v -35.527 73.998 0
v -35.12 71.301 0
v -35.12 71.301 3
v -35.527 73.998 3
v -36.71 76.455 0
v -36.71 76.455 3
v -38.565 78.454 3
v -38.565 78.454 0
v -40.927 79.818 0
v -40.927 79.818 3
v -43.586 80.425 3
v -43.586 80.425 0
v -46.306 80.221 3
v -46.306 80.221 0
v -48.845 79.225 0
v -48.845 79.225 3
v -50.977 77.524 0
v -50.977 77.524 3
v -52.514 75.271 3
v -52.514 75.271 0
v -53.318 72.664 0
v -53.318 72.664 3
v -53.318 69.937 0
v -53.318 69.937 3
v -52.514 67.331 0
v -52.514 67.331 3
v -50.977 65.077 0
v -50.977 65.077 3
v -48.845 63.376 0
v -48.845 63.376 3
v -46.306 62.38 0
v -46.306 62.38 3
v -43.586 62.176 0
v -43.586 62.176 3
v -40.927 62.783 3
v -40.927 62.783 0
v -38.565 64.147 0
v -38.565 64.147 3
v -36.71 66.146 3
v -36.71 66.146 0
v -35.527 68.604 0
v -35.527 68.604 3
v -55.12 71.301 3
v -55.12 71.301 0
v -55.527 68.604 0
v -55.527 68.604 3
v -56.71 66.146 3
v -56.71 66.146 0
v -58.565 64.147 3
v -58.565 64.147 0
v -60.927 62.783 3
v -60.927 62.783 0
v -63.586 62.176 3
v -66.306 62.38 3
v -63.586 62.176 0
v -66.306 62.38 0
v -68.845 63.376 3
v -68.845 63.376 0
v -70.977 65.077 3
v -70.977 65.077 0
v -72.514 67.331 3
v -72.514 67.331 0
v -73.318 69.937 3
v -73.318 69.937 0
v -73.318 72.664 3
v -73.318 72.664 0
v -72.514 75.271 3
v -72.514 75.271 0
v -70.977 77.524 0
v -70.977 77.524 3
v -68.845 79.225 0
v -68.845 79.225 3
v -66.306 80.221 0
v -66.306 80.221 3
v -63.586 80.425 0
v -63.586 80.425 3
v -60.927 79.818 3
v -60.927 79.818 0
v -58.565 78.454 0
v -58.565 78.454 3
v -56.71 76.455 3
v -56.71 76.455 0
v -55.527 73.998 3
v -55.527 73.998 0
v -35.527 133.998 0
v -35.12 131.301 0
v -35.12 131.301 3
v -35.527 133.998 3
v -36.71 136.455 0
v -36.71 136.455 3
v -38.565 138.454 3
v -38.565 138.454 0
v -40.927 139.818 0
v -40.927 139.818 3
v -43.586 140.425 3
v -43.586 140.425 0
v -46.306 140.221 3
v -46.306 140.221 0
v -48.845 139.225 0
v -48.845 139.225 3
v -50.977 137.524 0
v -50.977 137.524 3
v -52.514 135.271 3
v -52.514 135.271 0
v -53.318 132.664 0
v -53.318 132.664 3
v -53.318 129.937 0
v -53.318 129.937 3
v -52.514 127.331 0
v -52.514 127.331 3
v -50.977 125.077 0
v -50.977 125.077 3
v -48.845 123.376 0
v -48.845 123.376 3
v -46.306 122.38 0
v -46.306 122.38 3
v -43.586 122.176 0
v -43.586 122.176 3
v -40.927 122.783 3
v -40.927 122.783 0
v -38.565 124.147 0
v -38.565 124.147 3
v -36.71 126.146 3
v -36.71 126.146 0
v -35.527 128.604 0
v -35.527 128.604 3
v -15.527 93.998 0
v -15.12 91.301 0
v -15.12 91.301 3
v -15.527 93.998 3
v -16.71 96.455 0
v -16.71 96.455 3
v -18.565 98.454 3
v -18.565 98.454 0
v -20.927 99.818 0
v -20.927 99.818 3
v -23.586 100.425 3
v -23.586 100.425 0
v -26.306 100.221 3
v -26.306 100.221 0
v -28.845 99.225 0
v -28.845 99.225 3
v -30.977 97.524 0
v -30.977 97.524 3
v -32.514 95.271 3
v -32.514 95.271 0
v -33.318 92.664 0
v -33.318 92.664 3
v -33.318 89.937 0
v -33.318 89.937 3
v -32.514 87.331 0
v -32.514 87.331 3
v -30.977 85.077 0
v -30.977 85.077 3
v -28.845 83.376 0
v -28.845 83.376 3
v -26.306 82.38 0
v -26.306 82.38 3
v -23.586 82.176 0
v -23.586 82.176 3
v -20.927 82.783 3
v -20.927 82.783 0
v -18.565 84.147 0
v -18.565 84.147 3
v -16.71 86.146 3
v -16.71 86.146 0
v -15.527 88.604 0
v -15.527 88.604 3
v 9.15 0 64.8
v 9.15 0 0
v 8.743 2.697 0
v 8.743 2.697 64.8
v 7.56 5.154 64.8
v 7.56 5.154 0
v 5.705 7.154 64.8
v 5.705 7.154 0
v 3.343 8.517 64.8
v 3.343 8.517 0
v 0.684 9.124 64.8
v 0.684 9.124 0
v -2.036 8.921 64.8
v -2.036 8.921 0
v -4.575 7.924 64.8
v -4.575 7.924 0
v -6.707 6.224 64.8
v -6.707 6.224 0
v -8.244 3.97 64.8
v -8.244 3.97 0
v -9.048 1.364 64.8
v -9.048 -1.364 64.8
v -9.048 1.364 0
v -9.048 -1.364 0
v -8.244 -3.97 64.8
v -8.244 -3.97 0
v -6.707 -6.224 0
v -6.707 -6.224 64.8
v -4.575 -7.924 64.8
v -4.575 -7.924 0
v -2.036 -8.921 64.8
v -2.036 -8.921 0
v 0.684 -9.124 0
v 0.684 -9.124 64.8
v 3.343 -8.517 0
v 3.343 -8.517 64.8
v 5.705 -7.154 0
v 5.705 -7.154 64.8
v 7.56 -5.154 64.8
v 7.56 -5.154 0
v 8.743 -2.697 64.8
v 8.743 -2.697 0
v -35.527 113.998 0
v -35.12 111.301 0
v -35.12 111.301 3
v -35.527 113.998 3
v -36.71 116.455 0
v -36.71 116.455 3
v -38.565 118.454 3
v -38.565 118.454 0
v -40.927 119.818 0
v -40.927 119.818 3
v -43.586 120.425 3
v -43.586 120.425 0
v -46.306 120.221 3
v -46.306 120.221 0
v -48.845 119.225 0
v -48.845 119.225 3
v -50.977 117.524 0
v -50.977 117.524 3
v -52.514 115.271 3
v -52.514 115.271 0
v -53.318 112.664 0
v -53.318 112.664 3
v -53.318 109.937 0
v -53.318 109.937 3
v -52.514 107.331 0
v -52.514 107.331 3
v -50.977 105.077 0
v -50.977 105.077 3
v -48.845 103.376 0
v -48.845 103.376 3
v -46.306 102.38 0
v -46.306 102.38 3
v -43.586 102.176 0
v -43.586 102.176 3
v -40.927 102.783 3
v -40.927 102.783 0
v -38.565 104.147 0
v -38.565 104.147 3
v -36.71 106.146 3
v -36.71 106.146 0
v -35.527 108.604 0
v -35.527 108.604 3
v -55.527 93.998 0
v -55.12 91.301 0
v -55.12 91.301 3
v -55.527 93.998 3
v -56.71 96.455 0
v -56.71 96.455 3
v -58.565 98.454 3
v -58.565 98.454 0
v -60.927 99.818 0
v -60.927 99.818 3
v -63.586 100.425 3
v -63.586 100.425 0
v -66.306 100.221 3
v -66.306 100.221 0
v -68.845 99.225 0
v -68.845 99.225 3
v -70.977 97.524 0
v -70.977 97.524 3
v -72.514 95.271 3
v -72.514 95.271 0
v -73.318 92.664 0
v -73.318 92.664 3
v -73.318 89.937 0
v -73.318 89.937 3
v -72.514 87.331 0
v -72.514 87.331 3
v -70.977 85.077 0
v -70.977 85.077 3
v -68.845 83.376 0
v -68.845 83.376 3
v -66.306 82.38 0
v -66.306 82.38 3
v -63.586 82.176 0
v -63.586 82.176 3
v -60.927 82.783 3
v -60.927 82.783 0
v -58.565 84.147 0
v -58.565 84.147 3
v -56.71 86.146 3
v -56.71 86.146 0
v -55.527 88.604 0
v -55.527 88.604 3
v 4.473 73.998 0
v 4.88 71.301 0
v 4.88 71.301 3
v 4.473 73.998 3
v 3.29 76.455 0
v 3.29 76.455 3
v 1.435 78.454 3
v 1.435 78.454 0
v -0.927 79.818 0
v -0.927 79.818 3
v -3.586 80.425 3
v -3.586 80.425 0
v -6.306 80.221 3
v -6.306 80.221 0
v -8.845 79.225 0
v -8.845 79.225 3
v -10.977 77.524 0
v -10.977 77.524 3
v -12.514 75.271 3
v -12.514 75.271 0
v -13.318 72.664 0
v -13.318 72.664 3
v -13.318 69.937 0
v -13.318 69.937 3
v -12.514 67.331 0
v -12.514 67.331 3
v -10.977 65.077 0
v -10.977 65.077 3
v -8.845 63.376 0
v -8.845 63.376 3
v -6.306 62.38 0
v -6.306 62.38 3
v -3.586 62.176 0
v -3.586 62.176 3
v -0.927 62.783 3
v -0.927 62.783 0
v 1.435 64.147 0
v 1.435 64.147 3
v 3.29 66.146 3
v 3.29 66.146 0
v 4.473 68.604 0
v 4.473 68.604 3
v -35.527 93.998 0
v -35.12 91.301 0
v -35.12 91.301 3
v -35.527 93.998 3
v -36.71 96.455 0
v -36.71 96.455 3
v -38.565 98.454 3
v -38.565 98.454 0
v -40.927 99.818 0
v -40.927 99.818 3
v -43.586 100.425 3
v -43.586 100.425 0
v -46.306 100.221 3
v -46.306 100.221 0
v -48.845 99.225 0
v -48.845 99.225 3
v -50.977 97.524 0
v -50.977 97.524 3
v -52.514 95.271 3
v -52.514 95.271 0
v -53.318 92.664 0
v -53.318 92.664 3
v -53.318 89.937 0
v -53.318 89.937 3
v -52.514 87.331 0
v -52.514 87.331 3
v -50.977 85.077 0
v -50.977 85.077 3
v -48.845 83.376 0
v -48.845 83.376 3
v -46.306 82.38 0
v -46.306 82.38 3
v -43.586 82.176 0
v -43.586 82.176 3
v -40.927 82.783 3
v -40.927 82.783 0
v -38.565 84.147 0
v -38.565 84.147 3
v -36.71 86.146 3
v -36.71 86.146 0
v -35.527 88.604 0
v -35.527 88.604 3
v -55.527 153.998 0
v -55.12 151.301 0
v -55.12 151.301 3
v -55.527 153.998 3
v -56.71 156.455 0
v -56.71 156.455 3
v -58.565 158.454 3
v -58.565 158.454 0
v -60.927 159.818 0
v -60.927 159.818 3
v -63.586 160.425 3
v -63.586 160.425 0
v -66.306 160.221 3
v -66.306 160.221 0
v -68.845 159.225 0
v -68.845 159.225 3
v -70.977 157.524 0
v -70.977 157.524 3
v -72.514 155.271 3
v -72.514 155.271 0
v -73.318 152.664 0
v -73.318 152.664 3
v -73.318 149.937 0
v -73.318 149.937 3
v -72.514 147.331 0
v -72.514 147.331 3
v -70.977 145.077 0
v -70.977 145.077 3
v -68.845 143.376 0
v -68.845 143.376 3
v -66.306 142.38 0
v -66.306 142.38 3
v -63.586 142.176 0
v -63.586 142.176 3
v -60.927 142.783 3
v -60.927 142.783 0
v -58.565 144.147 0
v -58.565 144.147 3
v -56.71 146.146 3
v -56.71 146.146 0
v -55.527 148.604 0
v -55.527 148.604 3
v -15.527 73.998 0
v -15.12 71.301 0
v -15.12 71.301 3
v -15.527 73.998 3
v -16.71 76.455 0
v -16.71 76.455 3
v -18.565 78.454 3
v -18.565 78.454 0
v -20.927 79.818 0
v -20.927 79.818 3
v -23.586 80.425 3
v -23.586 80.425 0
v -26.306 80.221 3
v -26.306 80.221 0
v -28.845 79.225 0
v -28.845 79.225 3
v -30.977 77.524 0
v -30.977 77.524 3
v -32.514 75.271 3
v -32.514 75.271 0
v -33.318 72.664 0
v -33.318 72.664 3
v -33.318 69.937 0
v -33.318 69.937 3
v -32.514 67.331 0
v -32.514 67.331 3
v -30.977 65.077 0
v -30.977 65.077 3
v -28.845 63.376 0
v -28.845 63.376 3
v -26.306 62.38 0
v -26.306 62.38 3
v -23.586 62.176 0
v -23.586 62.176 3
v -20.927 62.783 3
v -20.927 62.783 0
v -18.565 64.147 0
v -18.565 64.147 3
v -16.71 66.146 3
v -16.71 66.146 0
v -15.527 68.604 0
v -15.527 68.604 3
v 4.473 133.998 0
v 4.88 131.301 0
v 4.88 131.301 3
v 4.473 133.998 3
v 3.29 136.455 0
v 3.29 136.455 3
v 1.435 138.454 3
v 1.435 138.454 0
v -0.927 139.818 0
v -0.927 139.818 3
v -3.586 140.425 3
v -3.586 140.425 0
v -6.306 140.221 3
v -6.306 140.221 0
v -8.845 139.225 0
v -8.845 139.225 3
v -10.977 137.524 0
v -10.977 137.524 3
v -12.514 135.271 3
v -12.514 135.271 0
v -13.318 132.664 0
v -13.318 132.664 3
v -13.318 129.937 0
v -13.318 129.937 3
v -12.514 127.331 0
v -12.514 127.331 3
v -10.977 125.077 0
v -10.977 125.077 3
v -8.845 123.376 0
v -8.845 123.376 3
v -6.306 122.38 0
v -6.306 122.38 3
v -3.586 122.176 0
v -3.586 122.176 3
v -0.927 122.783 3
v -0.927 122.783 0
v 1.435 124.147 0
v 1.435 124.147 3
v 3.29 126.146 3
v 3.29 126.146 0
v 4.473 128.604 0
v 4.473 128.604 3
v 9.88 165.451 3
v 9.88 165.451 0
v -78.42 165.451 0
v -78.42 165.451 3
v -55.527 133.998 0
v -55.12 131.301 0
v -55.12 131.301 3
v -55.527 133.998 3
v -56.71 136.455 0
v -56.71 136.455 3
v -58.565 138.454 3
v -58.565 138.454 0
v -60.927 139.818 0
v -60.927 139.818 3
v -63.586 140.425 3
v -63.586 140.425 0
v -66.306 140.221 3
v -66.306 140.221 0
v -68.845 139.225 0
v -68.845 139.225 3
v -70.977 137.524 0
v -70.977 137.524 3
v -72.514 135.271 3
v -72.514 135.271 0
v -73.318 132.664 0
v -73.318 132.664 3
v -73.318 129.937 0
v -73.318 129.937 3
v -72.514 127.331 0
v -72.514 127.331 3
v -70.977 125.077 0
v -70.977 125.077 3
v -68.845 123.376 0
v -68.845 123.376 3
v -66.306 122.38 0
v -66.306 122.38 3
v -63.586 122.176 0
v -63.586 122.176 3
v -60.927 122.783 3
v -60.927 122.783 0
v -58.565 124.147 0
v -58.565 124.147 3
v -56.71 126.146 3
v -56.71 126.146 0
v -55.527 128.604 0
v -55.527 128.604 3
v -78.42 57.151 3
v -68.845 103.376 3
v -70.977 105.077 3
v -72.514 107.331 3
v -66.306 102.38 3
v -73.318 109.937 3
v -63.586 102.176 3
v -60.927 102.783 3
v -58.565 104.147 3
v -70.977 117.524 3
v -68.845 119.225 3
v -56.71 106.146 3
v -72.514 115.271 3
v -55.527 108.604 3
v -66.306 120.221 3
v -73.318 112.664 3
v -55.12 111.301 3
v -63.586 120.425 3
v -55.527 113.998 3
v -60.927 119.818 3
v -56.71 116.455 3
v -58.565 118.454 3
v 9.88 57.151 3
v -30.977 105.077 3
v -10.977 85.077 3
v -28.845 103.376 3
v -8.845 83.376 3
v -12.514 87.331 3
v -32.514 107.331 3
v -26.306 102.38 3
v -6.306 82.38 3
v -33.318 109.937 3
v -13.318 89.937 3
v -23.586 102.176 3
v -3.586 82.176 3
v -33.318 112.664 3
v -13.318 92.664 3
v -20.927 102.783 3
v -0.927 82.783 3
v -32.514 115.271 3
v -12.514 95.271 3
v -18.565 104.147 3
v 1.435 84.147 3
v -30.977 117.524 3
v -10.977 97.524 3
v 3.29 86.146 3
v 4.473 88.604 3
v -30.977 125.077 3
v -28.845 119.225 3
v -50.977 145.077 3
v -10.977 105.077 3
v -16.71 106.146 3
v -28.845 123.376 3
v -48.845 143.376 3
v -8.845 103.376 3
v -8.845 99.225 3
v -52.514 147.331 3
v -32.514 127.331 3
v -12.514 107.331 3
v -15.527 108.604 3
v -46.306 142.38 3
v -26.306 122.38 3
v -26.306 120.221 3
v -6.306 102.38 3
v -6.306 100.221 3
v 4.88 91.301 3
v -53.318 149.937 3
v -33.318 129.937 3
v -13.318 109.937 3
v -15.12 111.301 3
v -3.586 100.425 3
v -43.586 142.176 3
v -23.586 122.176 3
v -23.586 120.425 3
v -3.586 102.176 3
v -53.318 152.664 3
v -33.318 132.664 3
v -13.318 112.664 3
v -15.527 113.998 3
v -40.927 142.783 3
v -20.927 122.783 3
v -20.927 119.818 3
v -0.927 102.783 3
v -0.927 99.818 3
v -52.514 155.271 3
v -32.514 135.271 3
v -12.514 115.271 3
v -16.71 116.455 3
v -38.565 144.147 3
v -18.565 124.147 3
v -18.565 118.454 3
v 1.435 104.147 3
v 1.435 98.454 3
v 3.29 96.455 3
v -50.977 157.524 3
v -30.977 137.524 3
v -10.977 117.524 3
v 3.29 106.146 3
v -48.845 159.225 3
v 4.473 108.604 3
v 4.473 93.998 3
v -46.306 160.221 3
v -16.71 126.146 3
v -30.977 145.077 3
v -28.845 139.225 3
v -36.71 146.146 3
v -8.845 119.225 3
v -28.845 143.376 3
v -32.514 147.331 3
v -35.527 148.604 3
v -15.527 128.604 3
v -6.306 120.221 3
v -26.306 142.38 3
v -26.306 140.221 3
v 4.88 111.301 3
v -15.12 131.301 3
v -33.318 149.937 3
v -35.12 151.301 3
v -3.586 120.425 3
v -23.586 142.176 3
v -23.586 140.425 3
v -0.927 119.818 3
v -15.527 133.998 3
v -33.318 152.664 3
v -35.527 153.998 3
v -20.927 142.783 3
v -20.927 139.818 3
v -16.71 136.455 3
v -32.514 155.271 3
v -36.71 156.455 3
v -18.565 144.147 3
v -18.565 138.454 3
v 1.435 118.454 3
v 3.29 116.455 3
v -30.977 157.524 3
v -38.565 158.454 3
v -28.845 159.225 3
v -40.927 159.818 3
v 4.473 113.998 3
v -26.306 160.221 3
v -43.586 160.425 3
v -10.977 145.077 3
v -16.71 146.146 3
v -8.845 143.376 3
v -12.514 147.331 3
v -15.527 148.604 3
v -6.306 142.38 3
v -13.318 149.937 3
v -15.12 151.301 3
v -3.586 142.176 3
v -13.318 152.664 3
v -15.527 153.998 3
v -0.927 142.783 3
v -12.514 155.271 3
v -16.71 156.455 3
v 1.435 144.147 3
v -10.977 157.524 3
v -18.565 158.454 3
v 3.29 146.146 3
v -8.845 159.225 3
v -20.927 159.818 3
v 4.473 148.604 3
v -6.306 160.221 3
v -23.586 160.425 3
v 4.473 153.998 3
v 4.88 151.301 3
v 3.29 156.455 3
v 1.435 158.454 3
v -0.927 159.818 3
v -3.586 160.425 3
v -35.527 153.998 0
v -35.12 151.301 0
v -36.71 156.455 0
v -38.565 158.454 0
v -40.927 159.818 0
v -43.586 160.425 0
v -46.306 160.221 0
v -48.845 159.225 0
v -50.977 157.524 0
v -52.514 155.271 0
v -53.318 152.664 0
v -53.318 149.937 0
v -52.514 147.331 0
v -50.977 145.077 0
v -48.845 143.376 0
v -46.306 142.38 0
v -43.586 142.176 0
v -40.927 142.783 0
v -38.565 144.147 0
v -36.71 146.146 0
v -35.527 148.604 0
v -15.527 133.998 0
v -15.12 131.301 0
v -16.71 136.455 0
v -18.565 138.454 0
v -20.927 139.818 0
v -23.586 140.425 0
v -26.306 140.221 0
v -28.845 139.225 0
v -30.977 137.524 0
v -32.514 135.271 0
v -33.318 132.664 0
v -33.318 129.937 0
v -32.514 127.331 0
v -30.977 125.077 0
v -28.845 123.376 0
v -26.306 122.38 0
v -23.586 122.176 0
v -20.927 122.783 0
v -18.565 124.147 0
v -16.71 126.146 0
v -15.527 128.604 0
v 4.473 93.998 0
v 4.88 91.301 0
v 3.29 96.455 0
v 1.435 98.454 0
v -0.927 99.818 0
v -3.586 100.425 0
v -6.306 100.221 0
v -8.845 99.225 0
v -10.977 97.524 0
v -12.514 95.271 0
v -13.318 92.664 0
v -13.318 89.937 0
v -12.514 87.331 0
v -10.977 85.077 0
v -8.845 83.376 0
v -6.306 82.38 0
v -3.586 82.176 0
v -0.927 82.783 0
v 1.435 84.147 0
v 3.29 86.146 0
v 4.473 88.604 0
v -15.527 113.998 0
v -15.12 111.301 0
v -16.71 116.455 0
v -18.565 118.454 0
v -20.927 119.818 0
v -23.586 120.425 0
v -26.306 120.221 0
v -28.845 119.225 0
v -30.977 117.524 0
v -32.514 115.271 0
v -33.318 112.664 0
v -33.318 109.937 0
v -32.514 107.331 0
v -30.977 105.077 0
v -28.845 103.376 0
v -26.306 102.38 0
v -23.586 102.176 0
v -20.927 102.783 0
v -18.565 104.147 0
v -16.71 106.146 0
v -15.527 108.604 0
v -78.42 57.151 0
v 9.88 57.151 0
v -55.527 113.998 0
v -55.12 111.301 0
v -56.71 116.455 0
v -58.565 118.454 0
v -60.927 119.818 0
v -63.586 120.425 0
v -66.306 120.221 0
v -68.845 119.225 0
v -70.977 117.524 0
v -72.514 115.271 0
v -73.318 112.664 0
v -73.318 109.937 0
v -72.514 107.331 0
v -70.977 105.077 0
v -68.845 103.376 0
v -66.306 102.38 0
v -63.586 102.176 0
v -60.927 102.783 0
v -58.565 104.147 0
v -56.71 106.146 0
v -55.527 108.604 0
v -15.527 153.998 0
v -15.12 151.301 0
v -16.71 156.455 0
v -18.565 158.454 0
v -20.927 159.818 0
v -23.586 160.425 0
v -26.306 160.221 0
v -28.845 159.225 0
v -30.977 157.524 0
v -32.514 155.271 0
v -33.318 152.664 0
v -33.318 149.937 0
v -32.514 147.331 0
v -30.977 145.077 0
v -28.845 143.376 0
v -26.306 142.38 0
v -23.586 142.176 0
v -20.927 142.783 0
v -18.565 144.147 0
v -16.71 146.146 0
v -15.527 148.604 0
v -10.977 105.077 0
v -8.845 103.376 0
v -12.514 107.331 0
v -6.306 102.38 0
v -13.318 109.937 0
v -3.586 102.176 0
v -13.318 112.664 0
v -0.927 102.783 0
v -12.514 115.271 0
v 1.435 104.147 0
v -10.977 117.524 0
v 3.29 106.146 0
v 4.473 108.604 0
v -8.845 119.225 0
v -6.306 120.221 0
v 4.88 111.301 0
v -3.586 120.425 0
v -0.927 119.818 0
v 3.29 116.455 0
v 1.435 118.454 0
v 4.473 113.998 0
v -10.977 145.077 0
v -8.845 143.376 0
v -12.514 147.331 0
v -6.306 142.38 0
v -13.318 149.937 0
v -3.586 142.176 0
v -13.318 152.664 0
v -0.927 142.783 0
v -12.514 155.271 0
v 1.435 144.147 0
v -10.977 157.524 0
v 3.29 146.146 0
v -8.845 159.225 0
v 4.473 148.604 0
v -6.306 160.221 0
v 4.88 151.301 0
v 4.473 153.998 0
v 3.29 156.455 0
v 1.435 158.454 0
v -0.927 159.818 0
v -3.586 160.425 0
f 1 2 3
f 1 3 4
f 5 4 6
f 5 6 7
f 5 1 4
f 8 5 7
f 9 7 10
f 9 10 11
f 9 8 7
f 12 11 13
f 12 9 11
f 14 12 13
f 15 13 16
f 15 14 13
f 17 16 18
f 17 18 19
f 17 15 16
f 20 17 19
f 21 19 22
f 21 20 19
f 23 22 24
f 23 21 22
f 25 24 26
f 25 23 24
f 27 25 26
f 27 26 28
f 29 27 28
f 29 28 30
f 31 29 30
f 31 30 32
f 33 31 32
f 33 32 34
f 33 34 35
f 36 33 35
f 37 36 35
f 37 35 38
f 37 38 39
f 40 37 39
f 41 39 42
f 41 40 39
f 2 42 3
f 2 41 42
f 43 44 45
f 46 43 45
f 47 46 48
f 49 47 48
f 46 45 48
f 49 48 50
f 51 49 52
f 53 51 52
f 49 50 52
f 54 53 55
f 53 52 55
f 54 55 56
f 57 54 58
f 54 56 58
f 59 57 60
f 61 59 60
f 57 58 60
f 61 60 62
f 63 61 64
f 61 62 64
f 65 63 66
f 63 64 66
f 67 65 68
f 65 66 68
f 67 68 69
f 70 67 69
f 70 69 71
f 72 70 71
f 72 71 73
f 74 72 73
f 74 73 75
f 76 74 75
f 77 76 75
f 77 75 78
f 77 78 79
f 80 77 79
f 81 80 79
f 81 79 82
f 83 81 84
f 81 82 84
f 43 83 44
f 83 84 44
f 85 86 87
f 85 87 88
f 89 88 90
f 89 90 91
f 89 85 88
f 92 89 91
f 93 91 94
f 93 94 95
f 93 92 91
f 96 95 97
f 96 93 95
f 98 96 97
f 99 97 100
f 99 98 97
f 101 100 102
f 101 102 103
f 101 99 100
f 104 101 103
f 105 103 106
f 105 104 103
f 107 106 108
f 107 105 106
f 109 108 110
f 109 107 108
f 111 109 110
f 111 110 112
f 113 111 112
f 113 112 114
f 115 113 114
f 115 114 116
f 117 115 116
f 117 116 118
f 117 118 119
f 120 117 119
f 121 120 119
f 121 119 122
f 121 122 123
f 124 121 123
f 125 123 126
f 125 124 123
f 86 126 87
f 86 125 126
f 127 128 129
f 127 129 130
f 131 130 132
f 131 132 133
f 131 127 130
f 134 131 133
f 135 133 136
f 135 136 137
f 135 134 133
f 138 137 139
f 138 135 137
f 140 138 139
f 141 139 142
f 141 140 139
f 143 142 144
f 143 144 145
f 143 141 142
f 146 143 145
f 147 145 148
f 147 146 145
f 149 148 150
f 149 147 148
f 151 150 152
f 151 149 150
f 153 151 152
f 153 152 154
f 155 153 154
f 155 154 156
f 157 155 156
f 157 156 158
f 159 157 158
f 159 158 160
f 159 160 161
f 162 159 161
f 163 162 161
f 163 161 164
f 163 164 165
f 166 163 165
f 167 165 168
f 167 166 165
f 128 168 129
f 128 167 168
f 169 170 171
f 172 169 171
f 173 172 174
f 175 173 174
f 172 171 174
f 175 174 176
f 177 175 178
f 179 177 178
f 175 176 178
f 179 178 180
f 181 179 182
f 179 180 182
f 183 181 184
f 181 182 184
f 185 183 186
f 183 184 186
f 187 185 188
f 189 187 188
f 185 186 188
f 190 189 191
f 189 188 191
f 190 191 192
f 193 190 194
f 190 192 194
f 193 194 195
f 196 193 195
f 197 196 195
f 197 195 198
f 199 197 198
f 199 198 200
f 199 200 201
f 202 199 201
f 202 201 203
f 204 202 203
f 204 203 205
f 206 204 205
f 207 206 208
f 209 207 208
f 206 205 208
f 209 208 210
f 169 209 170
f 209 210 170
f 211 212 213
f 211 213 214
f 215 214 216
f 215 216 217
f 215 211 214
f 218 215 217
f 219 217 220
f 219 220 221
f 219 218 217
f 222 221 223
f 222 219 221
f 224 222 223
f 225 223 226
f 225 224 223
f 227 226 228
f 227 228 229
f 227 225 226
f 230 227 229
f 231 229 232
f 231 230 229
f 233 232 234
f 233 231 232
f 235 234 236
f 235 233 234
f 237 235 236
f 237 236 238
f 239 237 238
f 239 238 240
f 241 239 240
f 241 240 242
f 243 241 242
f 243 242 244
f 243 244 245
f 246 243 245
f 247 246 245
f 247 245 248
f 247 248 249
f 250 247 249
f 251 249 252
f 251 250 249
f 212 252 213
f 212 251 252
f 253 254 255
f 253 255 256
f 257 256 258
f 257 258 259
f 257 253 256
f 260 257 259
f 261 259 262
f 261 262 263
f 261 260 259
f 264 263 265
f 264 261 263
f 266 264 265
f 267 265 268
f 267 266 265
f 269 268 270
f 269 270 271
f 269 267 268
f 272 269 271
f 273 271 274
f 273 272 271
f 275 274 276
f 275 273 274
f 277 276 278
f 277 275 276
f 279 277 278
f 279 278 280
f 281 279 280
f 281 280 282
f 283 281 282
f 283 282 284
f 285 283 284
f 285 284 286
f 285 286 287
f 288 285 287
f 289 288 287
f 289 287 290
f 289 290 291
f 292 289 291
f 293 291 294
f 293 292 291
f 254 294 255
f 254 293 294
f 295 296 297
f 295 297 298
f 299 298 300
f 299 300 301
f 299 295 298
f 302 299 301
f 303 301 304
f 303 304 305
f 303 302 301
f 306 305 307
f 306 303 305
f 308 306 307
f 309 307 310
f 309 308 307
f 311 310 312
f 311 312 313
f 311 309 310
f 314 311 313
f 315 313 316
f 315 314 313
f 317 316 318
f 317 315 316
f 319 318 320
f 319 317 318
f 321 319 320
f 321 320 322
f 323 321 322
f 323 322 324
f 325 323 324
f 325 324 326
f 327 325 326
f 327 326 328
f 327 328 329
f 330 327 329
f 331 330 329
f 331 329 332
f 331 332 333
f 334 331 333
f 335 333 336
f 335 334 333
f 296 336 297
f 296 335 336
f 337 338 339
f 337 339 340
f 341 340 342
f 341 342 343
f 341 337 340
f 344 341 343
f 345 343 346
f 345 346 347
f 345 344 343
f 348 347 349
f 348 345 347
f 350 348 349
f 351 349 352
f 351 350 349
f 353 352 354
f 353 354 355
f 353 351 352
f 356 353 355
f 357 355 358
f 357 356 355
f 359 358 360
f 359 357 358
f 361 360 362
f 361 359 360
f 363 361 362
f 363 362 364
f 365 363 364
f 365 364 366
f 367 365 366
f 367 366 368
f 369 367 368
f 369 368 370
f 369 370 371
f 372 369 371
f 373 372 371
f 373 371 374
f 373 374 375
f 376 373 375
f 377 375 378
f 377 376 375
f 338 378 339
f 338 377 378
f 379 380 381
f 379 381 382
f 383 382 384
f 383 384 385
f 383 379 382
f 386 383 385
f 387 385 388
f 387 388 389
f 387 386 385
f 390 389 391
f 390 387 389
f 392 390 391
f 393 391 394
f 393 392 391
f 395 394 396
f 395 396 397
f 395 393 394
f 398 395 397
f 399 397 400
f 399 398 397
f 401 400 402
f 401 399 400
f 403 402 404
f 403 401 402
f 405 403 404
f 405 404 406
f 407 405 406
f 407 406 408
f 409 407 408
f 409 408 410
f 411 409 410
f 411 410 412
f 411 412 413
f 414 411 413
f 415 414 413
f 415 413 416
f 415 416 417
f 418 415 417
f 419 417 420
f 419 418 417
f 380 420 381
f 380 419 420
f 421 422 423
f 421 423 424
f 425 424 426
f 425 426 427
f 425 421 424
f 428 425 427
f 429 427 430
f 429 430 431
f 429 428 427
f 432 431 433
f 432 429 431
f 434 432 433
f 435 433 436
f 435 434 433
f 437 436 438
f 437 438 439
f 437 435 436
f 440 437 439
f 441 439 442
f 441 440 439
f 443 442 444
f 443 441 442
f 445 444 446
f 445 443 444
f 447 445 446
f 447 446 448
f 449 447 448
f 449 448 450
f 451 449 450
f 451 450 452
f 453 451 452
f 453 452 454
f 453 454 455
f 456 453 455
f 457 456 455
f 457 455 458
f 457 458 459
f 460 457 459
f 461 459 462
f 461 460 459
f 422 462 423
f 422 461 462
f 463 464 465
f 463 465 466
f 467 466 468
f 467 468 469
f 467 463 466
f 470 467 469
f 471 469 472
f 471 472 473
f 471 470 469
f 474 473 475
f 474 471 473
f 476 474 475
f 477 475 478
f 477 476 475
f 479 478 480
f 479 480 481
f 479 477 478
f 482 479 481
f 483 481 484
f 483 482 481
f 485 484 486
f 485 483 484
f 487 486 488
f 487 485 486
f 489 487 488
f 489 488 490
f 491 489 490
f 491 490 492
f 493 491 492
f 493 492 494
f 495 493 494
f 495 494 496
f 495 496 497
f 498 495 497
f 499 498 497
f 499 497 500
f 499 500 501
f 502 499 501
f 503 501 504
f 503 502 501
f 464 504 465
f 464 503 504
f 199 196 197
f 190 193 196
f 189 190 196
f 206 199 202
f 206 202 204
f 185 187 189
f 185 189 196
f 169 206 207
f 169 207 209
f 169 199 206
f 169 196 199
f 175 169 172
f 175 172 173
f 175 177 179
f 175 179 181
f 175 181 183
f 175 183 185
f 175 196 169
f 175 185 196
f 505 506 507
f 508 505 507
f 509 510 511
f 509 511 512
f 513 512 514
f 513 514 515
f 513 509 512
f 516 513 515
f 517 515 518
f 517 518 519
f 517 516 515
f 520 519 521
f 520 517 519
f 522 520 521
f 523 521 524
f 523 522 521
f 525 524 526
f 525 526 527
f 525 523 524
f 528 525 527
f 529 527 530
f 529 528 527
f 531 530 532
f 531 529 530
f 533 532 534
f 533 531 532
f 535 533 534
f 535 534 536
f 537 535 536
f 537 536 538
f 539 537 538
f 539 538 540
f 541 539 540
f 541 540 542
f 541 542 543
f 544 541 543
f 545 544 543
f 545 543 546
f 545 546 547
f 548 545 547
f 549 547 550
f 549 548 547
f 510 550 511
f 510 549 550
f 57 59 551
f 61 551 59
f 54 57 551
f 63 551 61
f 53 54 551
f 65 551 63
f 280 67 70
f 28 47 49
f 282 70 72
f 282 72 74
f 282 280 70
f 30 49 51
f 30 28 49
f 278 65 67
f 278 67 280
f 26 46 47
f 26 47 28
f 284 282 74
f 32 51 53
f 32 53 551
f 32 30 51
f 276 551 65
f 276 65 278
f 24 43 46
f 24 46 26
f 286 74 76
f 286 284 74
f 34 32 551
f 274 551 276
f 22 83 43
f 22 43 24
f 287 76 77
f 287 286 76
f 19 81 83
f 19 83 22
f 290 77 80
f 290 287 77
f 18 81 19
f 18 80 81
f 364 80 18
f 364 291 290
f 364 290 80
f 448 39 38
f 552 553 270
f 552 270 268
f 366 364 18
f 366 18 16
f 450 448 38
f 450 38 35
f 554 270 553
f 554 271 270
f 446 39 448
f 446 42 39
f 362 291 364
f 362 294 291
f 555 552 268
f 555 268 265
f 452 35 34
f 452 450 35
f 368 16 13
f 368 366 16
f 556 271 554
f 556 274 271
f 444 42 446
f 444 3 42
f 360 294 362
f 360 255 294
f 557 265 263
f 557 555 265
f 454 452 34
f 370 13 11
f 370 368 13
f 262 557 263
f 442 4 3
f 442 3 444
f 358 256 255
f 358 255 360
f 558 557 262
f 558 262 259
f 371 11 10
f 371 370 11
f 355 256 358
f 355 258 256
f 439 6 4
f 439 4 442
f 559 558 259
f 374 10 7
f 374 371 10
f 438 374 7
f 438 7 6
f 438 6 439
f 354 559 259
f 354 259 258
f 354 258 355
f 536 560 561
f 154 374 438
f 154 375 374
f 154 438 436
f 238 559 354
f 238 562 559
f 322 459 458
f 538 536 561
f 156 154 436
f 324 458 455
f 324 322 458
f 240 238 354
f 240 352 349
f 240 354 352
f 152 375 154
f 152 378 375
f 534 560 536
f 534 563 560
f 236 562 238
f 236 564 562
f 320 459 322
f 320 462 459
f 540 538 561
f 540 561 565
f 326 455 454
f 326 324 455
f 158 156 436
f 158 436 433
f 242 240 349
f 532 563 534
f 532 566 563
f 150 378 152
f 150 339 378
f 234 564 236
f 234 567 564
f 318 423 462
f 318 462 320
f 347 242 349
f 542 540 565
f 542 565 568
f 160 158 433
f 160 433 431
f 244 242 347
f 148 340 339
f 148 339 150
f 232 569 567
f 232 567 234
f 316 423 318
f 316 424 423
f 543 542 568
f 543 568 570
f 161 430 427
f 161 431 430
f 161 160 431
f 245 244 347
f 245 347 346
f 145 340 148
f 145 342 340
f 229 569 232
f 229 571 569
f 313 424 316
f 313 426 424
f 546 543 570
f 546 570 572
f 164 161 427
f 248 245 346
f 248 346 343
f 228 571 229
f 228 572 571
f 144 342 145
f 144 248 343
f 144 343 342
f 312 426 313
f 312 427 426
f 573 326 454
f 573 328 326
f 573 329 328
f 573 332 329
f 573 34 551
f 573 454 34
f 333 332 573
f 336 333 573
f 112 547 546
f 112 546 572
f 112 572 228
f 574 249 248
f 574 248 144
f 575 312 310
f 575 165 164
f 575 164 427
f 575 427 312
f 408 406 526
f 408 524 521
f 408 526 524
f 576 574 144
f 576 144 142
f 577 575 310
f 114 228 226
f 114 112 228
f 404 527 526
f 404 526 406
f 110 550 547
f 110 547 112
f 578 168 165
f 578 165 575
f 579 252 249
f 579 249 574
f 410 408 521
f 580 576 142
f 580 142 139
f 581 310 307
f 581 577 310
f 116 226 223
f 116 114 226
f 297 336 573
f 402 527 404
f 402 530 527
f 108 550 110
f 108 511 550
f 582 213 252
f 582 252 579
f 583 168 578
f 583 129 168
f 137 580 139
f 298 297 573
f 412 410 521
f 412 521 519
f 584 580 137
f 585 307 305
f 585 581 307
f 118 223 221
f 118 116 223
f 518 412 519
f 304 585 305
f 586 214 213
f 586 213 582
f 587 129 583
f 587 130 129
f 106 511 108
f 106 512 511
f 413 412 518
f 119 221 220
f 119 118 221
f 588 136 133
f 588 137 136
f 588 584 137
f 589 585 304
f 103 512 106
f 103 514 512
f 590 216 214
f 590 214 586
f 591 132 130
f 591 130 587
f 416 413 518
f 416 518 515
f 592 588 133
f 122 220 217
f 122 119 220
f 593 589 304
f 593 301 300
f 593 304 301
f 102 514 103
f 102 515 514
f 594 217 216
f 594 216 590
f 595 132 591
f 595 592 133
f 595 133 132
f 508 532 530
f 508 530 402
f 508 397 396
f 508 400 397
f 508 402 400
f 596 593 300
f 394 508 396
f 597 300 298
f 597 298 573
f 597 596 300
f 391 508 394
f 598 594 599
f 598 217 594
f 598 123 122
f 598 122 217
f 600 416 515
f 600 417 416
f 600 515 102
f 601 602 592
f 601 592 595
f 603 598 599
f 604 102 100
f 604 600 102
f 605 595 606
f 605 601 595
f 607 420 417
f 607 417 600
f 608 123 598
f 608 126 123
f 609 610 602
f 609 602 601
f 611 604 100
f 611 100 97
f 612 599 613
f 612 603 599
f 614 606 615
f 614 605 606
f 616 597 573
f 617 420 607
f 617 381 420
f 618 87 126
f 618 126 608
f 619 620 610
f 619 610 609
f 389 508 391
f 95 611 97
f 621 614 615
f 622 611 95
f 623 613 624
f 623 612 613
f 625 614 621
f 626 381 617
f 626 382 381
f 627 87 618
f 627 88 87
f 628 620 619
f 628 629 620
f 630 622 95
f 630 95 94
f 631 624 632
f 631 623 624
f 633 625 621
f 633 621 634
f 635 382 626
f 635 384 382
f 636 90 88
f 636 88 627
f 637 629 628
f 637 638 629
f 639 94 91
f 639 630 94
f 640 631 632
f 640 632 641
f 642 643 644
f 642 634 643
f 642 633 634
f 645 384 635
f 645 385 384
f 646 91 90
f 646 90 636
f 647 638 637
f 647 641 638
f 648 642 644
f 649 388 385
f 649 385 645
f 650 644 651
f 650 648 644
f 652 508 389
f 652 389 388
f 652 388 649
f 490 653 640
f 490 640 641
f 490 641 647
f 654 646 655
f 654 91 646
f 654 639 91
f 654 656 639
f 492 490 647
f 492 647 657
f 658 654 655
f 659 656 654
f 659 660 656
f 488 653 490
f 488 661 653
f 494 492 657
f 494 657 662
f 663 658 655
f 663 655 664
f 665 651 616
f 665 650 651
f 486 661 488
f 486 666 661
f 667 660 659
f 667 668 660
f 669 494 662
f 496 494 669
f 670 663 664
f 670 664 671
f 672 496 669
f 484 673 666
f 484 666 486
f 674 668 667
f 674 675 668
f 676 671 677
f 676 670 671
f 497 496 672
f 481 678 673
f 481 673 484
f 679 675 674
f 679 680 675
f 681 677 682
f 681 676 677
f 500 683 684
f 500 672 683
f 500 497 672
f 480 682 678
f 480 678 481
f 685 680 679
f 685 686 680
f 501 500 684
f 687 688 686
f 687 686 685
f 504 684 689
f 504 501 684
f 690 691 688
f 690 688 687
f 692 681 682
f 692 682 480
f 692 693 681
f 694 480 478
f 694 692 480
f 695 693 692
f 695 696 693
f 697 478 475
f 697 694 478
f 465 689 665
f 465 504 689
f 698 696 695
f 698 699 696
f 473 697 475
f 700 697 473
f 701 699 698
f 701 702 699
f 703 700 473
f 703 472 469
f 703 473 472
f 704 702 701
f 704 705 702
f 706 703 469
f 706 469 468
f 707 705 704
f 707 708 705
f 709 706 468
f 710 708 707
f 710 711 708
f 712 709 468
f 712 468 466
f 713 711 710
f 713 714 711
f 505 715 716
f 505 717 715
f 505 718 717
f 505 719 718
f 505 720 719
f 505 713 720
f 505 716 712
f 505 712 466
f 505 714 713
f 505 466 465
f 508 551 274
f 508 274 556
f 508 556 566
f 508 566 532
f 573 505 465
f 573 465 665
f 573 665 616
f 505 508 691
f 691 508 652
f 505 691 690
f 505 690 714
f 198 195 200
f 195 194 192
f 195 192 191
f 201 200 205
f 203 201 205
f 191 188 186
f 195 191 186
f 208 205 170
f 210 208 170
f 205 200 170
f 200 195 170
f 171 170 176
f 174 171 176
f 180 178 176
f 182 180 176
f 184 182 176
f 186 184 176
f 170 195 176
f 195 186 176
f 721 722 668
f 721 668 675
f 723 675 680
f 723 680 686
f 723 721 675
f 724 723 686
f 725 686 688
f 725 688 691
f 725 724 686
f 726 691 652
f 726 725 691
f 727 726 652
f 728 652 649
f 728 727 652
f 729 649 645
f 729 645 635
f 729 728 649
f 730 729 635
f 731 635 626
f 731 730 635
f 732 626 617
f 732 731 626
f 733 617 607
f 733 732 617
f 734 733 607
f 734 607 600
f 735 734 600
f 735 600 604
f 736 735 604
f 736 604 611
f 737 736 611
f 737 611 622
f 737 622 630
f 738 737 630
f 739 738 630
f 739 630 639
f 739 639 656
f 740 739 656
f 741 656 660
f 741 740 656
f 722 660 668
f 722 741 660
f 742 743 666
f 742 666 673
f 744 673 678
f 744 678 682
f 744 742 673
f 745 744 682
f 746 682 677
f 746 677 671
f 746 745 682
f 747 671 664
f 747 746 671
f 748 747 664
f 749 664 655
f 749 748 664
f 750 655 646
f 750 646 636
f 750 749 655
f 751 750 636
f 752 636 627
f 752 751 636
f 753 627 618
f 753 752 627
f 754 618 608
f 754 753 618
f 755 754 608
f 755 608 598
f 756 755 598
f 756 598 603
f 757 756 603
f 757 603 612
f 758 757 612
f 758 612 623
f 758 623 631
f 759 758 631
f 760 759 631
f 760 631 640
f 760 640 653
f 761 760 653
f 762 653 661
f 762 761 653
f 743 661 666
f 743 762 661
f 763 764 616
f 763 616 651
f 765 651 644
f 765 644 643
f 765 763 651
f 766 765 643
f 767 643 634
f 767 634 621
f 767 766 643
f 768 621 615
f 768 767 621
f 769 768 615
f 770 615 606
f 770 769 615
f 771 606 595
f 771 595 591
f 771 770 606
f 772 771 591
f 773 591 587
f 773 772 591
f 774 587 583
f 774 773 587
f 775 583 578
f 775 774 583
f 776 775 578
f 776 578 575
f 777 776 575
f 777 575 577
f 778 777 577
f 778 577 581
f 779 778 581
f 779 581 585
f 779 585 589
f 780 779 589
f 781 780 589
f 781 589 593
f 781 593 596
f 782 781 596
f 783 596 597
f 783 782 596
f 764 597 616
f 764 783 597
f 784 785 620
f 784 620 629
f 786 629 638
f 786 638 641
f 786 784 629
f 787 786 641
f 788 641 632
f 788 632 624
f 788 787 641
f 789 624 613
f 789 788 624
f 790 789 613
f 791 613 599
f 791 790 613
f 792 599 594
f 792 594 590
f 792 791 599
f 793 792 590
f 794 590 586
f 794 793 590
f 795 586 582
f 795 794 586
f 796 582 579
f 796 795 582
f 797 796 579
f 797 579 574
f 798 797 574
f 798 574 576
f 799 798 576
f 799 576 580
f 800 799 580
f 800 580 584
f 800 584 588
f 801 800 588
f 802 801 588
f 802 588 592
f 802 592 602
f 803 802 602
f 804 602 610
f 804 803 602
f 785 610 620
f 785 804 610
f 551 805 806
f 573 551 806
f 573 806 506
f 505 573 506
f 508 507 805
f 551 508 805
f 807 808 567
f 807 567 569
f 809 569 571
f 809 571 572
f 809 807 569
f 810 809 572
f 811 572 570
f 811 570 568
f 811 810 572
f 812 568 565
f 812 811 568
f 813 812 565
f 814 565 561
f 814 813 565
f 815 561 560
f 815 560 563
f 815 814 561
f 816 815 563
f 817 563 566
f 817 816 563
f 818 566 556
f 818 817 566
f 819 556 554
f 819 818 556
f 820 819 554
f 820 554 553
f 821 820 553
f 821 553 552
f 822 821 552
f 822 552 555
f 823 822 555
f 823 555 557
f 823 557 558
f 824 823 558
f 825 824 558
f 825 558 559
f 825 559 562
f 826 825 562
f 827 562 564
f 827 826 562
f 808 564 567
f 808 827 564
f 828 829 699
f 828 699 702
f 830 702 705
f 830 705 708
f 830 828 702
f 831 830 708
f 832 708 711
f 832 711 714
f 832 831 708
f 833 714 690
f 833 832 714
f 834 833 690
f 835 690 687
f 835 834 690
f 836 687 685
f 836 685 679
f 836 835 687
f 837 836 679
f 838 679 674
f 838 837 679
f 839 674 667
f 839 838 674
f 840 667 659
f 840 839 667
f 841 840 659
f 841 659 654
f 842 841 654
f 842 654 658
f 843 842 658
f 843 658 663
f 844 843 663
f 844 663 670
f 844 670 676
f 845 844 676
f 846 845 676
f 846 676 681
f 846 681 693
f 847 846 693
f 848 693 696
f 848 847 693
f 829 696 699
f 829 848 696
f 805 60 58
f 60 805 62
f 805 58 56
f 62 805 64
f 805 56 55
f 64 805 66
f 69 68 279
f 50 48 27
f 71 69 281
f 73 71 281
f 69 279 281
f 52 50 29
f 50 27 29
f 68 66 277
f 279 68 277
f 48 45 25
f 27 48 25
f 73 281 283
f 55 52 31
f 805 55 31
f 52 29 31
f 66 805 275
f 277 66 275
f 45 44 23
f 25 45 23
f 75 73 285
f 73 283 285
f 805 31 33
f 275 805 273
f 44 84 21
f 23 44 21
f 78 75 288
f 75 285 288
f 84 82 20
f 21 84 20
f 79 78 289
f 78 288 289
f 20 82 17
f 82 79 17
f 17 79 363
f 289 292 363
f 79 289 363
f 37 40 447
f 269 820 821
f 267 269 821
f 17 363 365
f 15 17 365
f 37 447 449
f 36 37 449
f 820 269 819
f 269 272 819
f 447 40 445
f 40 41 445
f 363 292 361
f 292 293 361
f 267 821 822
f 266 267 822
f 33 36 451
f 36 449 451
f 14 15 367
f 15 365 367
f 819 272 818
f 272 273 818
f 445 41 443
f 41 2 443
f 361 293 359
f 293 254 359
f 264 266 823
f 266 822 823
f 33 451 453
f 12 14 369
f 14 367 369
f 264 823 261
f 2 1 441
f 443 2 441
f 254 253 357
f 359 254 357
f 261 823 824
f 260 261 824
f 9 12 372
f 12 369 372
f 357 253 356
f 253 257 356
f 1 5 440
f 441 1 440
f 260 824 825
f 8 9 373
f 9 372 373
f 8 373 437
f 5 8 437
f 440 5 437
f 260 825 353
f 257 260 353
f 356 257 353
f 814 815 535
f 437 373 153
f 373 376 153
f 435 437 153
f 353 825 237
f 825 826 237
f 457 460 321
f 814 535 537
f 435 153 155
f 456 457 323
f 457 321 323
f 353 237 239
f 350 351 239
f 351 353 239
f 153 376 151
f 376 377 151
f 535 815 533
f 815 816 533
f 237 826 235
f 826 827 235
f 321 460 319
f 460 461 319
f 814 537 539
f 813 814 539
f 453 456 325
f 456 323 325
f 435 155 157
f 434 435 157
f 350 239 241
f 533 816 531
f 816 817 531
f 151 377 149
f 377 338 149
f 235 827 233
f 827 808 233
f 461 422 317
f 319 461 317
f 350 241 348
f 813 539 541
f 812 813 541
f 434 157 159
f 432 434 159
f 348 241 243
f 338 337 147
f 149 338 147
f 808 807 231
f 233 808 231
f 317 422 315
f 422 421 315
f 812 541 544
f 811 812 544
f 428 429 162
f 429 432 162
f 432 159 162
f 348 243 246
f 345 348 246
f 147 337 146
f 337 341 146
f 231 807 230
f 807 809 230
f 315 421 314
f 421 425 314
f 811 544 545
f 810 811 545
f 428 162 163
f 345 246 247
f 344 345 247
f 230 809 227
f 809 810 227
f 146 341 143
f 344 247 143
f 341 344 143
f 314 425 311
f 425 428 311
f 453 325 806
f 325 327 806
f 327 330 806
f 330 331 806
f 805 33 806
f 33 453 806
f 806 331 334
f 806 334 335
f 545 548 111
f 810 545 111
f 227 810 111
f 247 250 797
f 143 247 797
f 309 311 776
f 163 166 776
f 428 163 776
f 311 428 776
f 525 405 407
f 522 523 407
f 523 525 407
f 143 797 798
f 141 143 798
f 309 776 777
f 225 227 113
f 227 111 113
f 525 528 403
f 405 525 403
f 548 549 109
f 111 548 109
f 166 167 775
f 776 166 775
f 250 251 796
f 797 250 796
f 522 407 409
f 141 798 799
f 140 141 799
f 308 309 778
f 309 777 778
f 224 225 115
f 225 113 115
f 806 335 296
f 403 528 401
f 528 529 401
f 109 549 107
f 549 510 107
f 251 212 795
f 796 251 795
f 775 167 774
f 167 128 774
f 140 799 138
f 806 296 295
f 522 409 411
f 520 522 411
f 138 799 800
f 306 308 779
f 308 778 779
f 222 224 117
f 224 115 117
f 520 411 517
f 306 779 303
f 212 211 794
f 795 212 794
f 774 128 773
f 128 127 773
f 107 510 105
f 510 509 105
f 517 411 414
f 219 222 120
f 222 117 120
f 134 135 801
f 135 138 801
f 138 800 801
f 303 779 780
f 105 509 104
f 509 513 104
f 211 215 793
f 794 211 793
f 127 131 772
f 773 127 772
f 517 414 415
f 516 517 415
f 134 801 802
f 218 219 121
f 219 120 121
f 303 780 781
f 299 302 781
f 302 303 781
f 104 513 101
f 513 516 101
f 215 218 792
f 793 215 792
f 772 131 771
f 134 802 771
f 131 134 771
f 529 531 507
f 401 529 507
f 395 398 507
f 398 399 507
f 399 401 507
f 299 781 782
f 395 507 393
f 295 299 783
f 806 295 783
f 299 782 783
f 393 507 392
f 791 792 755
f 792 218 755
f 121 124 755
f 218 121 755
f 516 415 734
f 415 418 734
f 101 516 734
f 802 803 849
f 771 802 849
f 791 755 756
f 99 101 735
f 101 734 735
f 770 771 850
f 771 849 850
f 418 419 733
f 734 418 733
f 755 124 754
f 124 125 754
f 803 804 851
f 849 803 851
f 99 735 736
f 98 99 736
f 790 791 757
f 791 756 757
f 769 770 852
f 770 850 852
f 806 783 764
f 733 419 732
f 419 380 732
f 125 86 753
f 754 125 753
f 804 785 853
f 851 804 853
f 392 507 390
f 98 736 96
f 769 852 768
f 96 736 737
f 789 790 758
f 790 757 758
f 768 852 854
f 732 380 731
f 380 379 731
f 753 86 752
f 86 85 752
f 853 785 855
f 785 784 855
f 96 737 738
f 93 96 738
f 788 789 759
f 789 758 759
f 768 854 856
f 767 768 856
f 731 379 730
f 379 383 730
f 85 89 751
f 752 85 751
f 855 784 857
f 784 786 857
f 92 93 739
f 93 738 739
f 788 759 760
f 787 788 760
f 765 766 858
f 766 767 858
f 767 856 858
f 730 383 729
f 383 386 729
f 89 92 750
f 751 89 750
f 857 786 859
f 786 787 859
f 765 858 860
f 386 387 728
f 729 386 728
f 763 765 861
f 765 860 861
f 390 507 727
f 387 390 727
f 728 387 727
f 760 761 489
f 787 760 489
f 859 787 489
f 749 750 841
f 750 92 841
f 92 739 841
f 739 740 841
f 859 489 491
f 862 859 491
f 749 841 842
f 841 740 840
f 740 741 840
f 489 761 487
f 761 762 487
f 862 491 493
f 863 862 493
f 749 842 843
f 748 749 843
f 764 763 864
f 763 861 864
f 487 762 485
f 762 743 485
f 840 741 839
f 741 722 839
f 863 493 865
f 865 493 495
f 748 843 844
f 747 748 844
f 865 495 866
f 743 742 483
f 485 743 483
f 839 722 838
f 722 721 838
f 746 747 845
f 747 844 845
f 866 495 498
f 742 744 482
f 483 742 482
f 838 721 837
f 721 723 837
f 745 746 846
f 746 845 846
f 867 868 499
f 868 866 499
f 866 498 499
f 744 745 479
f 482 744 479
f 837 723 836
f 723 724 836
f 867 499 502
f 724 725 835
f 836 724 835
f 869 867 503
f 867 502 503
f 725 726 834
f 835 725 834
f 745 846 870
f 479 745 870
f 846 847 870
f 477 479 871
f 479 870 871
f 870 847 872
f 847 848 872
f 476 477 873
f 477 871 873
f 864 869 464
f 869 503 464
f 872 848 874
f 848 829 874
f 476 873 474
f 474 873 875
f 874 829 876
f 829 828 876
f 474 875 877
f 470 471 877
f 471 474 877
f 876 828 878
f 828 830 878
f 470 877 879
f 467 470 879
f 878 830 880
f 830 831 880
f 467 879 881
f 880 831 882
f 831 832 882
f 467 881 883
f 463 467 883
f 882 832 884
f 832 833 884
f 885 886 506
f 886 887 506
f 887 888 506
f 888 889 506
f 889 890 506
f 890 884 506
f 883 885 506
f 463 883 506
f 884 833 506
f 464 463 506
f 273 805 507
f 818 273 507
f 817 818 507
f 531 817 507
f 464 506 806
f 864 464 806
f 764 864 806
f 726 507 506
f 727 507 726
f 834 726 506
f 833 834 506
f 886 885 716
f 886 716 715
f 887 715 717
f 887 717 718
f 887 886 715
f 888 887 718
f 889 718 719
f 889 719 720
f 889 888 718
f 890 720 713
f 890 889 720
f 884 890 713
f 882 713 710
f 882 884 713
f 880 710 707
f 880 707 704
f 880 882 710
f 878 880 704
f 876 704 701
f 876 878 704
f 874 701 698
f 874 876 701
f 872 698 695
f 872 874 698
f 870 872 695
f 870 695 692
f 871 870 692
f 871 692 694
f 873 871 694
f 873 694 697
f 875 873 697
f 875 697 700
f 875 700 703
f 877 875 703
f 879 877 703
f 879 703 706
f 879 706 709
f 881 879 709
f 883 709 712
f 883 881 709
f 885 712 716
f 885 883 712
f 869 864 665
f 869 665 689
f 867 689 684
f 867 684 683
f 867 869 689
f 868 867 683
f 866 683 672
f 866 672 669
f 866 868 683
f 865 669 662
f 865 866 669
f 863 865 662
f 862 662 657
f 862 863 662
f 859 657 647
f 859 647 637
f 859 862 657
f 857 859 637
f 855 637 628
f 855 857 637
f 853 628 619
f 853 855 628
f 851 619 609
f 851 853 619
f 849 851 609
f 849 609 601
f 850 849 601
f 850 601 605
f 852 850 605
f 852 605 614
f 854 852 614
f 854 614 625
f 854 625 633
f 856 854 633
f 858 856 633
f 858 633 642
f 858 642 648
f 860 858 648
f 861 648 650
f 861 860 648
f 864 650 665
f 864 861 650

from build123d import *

# Parameters (mm, degrees)
F0_R     = 9.15
F1_DEPTH = 64.8
F2_R     = 9.15
F3_DEPTH = 3


with BuildPart() as f1:
    # F0 (on Top) → F1 (new body)
    with BuildSketch(Plane.XY):
        Circle(F0_R)
    extrude(amount=F1_DEPTH)


with BuildPart() as f3:
    # F2 (on Top) → F3 (new body)
    with BuildSketch(Plane.XY):
        Polygon((-78.420075, 165.450537), (-78.420075, 71.300537), (-78.420075, 57.150537), (9.879925, 57.150537), (9.879925, 165.450537), align=None)
        with BuildLine():
            ThreePointArc((-73.420075, 71.300537), (-64.270075, 80.450537), (-55.120075, 71.300537))
            ThreePointArc((-55.120075, 71.300537), (-64.270075, 62.150537), (-73.420075, 71.300537))
        make_face(mode=Mode.SUBTRACT)
        with Locations((-44.270075, 71.300537)):
            Circle(F2_R, mode=Mode.SUBTRACT)
        with Locations((-64.270075, 91.300537)):
            Circle(F2_R, mode=Mode.SUBTRACT)
        with Locations((-44.270075, 91.300537)):
            Circle(F2_R, mode=Mode.SUBTRACT)
        with Locations((-24.270075, 71.300537)):
            Circle(F2_R, mode=Mode.SUBTRACT)
        with Locations((-4.270075, 71.300537)):
            Circle(F2_R, mode=Mode.SUBTRACT)
        with Locations((-24.270075, 91.300537)):
            Circle(F2_R, mode=Mode.SUBTRACT)
        with Locations((-4.270075, 91.300537)):
            Circle(F2_R, mode=Mode.SUBTRACT)
        with Locations((-64.270075, 111.300537)):
            Circle(F2_R, mode=Mode.SUBTRACT)
        with Locations((-64.270075, 131.300537)):
            Circle(F2_R, mode=Mode.SUBTRACT)
        with Locations((-44.270075, 111.300537)):
            Circle(F2_R, mode=Mode.SUBTRACT)
        with Locations((-44.270075, 131.300537)):
            Circle(F2_R, mode=Mode.SUBTRACT)
        with Locations((-64.270075, 151.300537)):
            Circle(F2_R, mode=Mode.SUBTRACT)
        with Locations((-44.270075, 151.300537)):
            Circle(F2_R, mode=Mode.SUBTRACT)
        with Locations((-24.270075, 111.300537)):
            Circle(F2_R, mode=Mode.SUBTRACT)
        with Locations((-24.270075, 131.300537)):
            Circle(F2_R, mode=Mode.SUBTRACT)
        with Locations((-4.270075, 111.300537)):
            Circle(F2_R, mode=Mode.SUBTRACT)
        with Locations((-4.270075, 131.300537)):
            Circle(F2_R, mode=Mode.SUBTRACT)
        with Locations((-24.270075, 151.300537)):
            Circle(F2_R, mode=Mode.SUBTRACT)
        with Locations((-4.270075, 151.300537)):
            Circle(F2_R, mode=Mode.SUBTRACT)
    extrude(amount=F3_DEPTH)


solid = Compound([f1.part, f3.part])
